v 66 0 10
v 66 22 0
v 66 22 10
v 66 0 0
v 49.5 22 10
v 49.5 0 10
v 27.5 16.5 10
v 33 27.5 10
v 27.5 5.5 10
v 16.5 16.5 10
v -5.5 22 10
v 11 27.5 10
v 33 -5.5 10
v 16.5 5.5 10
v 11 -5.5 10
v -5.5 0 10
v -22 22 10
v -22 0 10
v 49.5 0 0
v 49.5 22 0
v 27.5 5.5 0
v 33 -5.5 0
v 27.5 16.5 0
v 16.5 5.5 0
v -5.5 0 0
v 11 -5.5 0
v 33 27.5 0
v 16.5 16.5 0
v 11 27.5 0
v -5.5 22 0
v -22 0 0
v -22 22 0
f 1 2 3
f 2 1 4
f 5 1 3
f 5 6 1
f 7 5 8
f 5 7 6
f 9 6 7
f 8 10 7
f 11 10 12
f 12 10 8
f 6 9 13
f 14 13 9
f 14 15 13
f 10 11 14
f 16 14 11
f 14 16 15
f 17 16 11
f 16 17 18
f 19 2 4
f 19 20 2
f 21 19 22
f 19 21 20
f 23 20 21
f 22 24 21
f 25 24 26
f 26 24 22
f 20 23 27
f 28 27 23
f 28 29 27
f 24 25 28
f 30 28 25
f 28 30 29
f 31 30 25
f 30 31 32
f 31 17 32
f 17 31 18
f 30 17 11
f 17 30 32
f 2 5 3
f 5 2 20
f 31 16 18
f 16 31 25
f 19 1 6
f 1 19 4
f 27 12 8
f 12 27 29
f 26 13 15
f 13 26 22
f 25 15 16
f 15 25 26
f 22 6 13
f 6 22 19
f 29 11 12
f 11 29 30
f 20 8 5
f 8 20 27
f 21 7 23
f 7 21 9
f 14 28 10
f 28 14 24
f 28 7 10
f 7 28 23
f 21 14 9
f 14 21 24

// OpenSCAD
centralSquare = 11;
longeure=4*centralSquare;
epaisseur=10;
difference ()
{
	union ()
		{  
		translate([-longeure/2,0,0])
		cube([2*longeure,2*centralSquare,epaisseur]);
		translate([longeure/4,-centralSquare/2,0])
		cube([2*centralSquare,3*centralSquare,epaisseur]);	

		linear_extrude (height=epaisseur) polygon (points=[[centralSquare,0],[-centralSquare/2,0],[centralSquare,-centralSquare/2]]);
		linear_extrude (height=epaisseur) polygon (points=[[3*centralSquare,0],[3*centralSquare,-centralSquare/2],[4.5*centralSquare,0 ]]);	
		linear_extrude (height=epaisseur) polygon (points=[[centralSquare,2*centralSquare],[-centralSquare/2,2*centralSquare],[centralSquare,2*centralSquare+centralSquare/2]]);
		linear_extrude (height=epaisseur) polygon (points=[[3*centralSquare,2*centralSquare],[3*centralSquare,2*centralSquare+centralSquare/2],[4.5*centralSquare,2*centralSquare ]]);	
		}
		translate([longeure/2-centralSquare/2,centralSquare/2,-10])
		cube([centralSquare,centralSquare,2*epaisseur+20]);
	}
 
